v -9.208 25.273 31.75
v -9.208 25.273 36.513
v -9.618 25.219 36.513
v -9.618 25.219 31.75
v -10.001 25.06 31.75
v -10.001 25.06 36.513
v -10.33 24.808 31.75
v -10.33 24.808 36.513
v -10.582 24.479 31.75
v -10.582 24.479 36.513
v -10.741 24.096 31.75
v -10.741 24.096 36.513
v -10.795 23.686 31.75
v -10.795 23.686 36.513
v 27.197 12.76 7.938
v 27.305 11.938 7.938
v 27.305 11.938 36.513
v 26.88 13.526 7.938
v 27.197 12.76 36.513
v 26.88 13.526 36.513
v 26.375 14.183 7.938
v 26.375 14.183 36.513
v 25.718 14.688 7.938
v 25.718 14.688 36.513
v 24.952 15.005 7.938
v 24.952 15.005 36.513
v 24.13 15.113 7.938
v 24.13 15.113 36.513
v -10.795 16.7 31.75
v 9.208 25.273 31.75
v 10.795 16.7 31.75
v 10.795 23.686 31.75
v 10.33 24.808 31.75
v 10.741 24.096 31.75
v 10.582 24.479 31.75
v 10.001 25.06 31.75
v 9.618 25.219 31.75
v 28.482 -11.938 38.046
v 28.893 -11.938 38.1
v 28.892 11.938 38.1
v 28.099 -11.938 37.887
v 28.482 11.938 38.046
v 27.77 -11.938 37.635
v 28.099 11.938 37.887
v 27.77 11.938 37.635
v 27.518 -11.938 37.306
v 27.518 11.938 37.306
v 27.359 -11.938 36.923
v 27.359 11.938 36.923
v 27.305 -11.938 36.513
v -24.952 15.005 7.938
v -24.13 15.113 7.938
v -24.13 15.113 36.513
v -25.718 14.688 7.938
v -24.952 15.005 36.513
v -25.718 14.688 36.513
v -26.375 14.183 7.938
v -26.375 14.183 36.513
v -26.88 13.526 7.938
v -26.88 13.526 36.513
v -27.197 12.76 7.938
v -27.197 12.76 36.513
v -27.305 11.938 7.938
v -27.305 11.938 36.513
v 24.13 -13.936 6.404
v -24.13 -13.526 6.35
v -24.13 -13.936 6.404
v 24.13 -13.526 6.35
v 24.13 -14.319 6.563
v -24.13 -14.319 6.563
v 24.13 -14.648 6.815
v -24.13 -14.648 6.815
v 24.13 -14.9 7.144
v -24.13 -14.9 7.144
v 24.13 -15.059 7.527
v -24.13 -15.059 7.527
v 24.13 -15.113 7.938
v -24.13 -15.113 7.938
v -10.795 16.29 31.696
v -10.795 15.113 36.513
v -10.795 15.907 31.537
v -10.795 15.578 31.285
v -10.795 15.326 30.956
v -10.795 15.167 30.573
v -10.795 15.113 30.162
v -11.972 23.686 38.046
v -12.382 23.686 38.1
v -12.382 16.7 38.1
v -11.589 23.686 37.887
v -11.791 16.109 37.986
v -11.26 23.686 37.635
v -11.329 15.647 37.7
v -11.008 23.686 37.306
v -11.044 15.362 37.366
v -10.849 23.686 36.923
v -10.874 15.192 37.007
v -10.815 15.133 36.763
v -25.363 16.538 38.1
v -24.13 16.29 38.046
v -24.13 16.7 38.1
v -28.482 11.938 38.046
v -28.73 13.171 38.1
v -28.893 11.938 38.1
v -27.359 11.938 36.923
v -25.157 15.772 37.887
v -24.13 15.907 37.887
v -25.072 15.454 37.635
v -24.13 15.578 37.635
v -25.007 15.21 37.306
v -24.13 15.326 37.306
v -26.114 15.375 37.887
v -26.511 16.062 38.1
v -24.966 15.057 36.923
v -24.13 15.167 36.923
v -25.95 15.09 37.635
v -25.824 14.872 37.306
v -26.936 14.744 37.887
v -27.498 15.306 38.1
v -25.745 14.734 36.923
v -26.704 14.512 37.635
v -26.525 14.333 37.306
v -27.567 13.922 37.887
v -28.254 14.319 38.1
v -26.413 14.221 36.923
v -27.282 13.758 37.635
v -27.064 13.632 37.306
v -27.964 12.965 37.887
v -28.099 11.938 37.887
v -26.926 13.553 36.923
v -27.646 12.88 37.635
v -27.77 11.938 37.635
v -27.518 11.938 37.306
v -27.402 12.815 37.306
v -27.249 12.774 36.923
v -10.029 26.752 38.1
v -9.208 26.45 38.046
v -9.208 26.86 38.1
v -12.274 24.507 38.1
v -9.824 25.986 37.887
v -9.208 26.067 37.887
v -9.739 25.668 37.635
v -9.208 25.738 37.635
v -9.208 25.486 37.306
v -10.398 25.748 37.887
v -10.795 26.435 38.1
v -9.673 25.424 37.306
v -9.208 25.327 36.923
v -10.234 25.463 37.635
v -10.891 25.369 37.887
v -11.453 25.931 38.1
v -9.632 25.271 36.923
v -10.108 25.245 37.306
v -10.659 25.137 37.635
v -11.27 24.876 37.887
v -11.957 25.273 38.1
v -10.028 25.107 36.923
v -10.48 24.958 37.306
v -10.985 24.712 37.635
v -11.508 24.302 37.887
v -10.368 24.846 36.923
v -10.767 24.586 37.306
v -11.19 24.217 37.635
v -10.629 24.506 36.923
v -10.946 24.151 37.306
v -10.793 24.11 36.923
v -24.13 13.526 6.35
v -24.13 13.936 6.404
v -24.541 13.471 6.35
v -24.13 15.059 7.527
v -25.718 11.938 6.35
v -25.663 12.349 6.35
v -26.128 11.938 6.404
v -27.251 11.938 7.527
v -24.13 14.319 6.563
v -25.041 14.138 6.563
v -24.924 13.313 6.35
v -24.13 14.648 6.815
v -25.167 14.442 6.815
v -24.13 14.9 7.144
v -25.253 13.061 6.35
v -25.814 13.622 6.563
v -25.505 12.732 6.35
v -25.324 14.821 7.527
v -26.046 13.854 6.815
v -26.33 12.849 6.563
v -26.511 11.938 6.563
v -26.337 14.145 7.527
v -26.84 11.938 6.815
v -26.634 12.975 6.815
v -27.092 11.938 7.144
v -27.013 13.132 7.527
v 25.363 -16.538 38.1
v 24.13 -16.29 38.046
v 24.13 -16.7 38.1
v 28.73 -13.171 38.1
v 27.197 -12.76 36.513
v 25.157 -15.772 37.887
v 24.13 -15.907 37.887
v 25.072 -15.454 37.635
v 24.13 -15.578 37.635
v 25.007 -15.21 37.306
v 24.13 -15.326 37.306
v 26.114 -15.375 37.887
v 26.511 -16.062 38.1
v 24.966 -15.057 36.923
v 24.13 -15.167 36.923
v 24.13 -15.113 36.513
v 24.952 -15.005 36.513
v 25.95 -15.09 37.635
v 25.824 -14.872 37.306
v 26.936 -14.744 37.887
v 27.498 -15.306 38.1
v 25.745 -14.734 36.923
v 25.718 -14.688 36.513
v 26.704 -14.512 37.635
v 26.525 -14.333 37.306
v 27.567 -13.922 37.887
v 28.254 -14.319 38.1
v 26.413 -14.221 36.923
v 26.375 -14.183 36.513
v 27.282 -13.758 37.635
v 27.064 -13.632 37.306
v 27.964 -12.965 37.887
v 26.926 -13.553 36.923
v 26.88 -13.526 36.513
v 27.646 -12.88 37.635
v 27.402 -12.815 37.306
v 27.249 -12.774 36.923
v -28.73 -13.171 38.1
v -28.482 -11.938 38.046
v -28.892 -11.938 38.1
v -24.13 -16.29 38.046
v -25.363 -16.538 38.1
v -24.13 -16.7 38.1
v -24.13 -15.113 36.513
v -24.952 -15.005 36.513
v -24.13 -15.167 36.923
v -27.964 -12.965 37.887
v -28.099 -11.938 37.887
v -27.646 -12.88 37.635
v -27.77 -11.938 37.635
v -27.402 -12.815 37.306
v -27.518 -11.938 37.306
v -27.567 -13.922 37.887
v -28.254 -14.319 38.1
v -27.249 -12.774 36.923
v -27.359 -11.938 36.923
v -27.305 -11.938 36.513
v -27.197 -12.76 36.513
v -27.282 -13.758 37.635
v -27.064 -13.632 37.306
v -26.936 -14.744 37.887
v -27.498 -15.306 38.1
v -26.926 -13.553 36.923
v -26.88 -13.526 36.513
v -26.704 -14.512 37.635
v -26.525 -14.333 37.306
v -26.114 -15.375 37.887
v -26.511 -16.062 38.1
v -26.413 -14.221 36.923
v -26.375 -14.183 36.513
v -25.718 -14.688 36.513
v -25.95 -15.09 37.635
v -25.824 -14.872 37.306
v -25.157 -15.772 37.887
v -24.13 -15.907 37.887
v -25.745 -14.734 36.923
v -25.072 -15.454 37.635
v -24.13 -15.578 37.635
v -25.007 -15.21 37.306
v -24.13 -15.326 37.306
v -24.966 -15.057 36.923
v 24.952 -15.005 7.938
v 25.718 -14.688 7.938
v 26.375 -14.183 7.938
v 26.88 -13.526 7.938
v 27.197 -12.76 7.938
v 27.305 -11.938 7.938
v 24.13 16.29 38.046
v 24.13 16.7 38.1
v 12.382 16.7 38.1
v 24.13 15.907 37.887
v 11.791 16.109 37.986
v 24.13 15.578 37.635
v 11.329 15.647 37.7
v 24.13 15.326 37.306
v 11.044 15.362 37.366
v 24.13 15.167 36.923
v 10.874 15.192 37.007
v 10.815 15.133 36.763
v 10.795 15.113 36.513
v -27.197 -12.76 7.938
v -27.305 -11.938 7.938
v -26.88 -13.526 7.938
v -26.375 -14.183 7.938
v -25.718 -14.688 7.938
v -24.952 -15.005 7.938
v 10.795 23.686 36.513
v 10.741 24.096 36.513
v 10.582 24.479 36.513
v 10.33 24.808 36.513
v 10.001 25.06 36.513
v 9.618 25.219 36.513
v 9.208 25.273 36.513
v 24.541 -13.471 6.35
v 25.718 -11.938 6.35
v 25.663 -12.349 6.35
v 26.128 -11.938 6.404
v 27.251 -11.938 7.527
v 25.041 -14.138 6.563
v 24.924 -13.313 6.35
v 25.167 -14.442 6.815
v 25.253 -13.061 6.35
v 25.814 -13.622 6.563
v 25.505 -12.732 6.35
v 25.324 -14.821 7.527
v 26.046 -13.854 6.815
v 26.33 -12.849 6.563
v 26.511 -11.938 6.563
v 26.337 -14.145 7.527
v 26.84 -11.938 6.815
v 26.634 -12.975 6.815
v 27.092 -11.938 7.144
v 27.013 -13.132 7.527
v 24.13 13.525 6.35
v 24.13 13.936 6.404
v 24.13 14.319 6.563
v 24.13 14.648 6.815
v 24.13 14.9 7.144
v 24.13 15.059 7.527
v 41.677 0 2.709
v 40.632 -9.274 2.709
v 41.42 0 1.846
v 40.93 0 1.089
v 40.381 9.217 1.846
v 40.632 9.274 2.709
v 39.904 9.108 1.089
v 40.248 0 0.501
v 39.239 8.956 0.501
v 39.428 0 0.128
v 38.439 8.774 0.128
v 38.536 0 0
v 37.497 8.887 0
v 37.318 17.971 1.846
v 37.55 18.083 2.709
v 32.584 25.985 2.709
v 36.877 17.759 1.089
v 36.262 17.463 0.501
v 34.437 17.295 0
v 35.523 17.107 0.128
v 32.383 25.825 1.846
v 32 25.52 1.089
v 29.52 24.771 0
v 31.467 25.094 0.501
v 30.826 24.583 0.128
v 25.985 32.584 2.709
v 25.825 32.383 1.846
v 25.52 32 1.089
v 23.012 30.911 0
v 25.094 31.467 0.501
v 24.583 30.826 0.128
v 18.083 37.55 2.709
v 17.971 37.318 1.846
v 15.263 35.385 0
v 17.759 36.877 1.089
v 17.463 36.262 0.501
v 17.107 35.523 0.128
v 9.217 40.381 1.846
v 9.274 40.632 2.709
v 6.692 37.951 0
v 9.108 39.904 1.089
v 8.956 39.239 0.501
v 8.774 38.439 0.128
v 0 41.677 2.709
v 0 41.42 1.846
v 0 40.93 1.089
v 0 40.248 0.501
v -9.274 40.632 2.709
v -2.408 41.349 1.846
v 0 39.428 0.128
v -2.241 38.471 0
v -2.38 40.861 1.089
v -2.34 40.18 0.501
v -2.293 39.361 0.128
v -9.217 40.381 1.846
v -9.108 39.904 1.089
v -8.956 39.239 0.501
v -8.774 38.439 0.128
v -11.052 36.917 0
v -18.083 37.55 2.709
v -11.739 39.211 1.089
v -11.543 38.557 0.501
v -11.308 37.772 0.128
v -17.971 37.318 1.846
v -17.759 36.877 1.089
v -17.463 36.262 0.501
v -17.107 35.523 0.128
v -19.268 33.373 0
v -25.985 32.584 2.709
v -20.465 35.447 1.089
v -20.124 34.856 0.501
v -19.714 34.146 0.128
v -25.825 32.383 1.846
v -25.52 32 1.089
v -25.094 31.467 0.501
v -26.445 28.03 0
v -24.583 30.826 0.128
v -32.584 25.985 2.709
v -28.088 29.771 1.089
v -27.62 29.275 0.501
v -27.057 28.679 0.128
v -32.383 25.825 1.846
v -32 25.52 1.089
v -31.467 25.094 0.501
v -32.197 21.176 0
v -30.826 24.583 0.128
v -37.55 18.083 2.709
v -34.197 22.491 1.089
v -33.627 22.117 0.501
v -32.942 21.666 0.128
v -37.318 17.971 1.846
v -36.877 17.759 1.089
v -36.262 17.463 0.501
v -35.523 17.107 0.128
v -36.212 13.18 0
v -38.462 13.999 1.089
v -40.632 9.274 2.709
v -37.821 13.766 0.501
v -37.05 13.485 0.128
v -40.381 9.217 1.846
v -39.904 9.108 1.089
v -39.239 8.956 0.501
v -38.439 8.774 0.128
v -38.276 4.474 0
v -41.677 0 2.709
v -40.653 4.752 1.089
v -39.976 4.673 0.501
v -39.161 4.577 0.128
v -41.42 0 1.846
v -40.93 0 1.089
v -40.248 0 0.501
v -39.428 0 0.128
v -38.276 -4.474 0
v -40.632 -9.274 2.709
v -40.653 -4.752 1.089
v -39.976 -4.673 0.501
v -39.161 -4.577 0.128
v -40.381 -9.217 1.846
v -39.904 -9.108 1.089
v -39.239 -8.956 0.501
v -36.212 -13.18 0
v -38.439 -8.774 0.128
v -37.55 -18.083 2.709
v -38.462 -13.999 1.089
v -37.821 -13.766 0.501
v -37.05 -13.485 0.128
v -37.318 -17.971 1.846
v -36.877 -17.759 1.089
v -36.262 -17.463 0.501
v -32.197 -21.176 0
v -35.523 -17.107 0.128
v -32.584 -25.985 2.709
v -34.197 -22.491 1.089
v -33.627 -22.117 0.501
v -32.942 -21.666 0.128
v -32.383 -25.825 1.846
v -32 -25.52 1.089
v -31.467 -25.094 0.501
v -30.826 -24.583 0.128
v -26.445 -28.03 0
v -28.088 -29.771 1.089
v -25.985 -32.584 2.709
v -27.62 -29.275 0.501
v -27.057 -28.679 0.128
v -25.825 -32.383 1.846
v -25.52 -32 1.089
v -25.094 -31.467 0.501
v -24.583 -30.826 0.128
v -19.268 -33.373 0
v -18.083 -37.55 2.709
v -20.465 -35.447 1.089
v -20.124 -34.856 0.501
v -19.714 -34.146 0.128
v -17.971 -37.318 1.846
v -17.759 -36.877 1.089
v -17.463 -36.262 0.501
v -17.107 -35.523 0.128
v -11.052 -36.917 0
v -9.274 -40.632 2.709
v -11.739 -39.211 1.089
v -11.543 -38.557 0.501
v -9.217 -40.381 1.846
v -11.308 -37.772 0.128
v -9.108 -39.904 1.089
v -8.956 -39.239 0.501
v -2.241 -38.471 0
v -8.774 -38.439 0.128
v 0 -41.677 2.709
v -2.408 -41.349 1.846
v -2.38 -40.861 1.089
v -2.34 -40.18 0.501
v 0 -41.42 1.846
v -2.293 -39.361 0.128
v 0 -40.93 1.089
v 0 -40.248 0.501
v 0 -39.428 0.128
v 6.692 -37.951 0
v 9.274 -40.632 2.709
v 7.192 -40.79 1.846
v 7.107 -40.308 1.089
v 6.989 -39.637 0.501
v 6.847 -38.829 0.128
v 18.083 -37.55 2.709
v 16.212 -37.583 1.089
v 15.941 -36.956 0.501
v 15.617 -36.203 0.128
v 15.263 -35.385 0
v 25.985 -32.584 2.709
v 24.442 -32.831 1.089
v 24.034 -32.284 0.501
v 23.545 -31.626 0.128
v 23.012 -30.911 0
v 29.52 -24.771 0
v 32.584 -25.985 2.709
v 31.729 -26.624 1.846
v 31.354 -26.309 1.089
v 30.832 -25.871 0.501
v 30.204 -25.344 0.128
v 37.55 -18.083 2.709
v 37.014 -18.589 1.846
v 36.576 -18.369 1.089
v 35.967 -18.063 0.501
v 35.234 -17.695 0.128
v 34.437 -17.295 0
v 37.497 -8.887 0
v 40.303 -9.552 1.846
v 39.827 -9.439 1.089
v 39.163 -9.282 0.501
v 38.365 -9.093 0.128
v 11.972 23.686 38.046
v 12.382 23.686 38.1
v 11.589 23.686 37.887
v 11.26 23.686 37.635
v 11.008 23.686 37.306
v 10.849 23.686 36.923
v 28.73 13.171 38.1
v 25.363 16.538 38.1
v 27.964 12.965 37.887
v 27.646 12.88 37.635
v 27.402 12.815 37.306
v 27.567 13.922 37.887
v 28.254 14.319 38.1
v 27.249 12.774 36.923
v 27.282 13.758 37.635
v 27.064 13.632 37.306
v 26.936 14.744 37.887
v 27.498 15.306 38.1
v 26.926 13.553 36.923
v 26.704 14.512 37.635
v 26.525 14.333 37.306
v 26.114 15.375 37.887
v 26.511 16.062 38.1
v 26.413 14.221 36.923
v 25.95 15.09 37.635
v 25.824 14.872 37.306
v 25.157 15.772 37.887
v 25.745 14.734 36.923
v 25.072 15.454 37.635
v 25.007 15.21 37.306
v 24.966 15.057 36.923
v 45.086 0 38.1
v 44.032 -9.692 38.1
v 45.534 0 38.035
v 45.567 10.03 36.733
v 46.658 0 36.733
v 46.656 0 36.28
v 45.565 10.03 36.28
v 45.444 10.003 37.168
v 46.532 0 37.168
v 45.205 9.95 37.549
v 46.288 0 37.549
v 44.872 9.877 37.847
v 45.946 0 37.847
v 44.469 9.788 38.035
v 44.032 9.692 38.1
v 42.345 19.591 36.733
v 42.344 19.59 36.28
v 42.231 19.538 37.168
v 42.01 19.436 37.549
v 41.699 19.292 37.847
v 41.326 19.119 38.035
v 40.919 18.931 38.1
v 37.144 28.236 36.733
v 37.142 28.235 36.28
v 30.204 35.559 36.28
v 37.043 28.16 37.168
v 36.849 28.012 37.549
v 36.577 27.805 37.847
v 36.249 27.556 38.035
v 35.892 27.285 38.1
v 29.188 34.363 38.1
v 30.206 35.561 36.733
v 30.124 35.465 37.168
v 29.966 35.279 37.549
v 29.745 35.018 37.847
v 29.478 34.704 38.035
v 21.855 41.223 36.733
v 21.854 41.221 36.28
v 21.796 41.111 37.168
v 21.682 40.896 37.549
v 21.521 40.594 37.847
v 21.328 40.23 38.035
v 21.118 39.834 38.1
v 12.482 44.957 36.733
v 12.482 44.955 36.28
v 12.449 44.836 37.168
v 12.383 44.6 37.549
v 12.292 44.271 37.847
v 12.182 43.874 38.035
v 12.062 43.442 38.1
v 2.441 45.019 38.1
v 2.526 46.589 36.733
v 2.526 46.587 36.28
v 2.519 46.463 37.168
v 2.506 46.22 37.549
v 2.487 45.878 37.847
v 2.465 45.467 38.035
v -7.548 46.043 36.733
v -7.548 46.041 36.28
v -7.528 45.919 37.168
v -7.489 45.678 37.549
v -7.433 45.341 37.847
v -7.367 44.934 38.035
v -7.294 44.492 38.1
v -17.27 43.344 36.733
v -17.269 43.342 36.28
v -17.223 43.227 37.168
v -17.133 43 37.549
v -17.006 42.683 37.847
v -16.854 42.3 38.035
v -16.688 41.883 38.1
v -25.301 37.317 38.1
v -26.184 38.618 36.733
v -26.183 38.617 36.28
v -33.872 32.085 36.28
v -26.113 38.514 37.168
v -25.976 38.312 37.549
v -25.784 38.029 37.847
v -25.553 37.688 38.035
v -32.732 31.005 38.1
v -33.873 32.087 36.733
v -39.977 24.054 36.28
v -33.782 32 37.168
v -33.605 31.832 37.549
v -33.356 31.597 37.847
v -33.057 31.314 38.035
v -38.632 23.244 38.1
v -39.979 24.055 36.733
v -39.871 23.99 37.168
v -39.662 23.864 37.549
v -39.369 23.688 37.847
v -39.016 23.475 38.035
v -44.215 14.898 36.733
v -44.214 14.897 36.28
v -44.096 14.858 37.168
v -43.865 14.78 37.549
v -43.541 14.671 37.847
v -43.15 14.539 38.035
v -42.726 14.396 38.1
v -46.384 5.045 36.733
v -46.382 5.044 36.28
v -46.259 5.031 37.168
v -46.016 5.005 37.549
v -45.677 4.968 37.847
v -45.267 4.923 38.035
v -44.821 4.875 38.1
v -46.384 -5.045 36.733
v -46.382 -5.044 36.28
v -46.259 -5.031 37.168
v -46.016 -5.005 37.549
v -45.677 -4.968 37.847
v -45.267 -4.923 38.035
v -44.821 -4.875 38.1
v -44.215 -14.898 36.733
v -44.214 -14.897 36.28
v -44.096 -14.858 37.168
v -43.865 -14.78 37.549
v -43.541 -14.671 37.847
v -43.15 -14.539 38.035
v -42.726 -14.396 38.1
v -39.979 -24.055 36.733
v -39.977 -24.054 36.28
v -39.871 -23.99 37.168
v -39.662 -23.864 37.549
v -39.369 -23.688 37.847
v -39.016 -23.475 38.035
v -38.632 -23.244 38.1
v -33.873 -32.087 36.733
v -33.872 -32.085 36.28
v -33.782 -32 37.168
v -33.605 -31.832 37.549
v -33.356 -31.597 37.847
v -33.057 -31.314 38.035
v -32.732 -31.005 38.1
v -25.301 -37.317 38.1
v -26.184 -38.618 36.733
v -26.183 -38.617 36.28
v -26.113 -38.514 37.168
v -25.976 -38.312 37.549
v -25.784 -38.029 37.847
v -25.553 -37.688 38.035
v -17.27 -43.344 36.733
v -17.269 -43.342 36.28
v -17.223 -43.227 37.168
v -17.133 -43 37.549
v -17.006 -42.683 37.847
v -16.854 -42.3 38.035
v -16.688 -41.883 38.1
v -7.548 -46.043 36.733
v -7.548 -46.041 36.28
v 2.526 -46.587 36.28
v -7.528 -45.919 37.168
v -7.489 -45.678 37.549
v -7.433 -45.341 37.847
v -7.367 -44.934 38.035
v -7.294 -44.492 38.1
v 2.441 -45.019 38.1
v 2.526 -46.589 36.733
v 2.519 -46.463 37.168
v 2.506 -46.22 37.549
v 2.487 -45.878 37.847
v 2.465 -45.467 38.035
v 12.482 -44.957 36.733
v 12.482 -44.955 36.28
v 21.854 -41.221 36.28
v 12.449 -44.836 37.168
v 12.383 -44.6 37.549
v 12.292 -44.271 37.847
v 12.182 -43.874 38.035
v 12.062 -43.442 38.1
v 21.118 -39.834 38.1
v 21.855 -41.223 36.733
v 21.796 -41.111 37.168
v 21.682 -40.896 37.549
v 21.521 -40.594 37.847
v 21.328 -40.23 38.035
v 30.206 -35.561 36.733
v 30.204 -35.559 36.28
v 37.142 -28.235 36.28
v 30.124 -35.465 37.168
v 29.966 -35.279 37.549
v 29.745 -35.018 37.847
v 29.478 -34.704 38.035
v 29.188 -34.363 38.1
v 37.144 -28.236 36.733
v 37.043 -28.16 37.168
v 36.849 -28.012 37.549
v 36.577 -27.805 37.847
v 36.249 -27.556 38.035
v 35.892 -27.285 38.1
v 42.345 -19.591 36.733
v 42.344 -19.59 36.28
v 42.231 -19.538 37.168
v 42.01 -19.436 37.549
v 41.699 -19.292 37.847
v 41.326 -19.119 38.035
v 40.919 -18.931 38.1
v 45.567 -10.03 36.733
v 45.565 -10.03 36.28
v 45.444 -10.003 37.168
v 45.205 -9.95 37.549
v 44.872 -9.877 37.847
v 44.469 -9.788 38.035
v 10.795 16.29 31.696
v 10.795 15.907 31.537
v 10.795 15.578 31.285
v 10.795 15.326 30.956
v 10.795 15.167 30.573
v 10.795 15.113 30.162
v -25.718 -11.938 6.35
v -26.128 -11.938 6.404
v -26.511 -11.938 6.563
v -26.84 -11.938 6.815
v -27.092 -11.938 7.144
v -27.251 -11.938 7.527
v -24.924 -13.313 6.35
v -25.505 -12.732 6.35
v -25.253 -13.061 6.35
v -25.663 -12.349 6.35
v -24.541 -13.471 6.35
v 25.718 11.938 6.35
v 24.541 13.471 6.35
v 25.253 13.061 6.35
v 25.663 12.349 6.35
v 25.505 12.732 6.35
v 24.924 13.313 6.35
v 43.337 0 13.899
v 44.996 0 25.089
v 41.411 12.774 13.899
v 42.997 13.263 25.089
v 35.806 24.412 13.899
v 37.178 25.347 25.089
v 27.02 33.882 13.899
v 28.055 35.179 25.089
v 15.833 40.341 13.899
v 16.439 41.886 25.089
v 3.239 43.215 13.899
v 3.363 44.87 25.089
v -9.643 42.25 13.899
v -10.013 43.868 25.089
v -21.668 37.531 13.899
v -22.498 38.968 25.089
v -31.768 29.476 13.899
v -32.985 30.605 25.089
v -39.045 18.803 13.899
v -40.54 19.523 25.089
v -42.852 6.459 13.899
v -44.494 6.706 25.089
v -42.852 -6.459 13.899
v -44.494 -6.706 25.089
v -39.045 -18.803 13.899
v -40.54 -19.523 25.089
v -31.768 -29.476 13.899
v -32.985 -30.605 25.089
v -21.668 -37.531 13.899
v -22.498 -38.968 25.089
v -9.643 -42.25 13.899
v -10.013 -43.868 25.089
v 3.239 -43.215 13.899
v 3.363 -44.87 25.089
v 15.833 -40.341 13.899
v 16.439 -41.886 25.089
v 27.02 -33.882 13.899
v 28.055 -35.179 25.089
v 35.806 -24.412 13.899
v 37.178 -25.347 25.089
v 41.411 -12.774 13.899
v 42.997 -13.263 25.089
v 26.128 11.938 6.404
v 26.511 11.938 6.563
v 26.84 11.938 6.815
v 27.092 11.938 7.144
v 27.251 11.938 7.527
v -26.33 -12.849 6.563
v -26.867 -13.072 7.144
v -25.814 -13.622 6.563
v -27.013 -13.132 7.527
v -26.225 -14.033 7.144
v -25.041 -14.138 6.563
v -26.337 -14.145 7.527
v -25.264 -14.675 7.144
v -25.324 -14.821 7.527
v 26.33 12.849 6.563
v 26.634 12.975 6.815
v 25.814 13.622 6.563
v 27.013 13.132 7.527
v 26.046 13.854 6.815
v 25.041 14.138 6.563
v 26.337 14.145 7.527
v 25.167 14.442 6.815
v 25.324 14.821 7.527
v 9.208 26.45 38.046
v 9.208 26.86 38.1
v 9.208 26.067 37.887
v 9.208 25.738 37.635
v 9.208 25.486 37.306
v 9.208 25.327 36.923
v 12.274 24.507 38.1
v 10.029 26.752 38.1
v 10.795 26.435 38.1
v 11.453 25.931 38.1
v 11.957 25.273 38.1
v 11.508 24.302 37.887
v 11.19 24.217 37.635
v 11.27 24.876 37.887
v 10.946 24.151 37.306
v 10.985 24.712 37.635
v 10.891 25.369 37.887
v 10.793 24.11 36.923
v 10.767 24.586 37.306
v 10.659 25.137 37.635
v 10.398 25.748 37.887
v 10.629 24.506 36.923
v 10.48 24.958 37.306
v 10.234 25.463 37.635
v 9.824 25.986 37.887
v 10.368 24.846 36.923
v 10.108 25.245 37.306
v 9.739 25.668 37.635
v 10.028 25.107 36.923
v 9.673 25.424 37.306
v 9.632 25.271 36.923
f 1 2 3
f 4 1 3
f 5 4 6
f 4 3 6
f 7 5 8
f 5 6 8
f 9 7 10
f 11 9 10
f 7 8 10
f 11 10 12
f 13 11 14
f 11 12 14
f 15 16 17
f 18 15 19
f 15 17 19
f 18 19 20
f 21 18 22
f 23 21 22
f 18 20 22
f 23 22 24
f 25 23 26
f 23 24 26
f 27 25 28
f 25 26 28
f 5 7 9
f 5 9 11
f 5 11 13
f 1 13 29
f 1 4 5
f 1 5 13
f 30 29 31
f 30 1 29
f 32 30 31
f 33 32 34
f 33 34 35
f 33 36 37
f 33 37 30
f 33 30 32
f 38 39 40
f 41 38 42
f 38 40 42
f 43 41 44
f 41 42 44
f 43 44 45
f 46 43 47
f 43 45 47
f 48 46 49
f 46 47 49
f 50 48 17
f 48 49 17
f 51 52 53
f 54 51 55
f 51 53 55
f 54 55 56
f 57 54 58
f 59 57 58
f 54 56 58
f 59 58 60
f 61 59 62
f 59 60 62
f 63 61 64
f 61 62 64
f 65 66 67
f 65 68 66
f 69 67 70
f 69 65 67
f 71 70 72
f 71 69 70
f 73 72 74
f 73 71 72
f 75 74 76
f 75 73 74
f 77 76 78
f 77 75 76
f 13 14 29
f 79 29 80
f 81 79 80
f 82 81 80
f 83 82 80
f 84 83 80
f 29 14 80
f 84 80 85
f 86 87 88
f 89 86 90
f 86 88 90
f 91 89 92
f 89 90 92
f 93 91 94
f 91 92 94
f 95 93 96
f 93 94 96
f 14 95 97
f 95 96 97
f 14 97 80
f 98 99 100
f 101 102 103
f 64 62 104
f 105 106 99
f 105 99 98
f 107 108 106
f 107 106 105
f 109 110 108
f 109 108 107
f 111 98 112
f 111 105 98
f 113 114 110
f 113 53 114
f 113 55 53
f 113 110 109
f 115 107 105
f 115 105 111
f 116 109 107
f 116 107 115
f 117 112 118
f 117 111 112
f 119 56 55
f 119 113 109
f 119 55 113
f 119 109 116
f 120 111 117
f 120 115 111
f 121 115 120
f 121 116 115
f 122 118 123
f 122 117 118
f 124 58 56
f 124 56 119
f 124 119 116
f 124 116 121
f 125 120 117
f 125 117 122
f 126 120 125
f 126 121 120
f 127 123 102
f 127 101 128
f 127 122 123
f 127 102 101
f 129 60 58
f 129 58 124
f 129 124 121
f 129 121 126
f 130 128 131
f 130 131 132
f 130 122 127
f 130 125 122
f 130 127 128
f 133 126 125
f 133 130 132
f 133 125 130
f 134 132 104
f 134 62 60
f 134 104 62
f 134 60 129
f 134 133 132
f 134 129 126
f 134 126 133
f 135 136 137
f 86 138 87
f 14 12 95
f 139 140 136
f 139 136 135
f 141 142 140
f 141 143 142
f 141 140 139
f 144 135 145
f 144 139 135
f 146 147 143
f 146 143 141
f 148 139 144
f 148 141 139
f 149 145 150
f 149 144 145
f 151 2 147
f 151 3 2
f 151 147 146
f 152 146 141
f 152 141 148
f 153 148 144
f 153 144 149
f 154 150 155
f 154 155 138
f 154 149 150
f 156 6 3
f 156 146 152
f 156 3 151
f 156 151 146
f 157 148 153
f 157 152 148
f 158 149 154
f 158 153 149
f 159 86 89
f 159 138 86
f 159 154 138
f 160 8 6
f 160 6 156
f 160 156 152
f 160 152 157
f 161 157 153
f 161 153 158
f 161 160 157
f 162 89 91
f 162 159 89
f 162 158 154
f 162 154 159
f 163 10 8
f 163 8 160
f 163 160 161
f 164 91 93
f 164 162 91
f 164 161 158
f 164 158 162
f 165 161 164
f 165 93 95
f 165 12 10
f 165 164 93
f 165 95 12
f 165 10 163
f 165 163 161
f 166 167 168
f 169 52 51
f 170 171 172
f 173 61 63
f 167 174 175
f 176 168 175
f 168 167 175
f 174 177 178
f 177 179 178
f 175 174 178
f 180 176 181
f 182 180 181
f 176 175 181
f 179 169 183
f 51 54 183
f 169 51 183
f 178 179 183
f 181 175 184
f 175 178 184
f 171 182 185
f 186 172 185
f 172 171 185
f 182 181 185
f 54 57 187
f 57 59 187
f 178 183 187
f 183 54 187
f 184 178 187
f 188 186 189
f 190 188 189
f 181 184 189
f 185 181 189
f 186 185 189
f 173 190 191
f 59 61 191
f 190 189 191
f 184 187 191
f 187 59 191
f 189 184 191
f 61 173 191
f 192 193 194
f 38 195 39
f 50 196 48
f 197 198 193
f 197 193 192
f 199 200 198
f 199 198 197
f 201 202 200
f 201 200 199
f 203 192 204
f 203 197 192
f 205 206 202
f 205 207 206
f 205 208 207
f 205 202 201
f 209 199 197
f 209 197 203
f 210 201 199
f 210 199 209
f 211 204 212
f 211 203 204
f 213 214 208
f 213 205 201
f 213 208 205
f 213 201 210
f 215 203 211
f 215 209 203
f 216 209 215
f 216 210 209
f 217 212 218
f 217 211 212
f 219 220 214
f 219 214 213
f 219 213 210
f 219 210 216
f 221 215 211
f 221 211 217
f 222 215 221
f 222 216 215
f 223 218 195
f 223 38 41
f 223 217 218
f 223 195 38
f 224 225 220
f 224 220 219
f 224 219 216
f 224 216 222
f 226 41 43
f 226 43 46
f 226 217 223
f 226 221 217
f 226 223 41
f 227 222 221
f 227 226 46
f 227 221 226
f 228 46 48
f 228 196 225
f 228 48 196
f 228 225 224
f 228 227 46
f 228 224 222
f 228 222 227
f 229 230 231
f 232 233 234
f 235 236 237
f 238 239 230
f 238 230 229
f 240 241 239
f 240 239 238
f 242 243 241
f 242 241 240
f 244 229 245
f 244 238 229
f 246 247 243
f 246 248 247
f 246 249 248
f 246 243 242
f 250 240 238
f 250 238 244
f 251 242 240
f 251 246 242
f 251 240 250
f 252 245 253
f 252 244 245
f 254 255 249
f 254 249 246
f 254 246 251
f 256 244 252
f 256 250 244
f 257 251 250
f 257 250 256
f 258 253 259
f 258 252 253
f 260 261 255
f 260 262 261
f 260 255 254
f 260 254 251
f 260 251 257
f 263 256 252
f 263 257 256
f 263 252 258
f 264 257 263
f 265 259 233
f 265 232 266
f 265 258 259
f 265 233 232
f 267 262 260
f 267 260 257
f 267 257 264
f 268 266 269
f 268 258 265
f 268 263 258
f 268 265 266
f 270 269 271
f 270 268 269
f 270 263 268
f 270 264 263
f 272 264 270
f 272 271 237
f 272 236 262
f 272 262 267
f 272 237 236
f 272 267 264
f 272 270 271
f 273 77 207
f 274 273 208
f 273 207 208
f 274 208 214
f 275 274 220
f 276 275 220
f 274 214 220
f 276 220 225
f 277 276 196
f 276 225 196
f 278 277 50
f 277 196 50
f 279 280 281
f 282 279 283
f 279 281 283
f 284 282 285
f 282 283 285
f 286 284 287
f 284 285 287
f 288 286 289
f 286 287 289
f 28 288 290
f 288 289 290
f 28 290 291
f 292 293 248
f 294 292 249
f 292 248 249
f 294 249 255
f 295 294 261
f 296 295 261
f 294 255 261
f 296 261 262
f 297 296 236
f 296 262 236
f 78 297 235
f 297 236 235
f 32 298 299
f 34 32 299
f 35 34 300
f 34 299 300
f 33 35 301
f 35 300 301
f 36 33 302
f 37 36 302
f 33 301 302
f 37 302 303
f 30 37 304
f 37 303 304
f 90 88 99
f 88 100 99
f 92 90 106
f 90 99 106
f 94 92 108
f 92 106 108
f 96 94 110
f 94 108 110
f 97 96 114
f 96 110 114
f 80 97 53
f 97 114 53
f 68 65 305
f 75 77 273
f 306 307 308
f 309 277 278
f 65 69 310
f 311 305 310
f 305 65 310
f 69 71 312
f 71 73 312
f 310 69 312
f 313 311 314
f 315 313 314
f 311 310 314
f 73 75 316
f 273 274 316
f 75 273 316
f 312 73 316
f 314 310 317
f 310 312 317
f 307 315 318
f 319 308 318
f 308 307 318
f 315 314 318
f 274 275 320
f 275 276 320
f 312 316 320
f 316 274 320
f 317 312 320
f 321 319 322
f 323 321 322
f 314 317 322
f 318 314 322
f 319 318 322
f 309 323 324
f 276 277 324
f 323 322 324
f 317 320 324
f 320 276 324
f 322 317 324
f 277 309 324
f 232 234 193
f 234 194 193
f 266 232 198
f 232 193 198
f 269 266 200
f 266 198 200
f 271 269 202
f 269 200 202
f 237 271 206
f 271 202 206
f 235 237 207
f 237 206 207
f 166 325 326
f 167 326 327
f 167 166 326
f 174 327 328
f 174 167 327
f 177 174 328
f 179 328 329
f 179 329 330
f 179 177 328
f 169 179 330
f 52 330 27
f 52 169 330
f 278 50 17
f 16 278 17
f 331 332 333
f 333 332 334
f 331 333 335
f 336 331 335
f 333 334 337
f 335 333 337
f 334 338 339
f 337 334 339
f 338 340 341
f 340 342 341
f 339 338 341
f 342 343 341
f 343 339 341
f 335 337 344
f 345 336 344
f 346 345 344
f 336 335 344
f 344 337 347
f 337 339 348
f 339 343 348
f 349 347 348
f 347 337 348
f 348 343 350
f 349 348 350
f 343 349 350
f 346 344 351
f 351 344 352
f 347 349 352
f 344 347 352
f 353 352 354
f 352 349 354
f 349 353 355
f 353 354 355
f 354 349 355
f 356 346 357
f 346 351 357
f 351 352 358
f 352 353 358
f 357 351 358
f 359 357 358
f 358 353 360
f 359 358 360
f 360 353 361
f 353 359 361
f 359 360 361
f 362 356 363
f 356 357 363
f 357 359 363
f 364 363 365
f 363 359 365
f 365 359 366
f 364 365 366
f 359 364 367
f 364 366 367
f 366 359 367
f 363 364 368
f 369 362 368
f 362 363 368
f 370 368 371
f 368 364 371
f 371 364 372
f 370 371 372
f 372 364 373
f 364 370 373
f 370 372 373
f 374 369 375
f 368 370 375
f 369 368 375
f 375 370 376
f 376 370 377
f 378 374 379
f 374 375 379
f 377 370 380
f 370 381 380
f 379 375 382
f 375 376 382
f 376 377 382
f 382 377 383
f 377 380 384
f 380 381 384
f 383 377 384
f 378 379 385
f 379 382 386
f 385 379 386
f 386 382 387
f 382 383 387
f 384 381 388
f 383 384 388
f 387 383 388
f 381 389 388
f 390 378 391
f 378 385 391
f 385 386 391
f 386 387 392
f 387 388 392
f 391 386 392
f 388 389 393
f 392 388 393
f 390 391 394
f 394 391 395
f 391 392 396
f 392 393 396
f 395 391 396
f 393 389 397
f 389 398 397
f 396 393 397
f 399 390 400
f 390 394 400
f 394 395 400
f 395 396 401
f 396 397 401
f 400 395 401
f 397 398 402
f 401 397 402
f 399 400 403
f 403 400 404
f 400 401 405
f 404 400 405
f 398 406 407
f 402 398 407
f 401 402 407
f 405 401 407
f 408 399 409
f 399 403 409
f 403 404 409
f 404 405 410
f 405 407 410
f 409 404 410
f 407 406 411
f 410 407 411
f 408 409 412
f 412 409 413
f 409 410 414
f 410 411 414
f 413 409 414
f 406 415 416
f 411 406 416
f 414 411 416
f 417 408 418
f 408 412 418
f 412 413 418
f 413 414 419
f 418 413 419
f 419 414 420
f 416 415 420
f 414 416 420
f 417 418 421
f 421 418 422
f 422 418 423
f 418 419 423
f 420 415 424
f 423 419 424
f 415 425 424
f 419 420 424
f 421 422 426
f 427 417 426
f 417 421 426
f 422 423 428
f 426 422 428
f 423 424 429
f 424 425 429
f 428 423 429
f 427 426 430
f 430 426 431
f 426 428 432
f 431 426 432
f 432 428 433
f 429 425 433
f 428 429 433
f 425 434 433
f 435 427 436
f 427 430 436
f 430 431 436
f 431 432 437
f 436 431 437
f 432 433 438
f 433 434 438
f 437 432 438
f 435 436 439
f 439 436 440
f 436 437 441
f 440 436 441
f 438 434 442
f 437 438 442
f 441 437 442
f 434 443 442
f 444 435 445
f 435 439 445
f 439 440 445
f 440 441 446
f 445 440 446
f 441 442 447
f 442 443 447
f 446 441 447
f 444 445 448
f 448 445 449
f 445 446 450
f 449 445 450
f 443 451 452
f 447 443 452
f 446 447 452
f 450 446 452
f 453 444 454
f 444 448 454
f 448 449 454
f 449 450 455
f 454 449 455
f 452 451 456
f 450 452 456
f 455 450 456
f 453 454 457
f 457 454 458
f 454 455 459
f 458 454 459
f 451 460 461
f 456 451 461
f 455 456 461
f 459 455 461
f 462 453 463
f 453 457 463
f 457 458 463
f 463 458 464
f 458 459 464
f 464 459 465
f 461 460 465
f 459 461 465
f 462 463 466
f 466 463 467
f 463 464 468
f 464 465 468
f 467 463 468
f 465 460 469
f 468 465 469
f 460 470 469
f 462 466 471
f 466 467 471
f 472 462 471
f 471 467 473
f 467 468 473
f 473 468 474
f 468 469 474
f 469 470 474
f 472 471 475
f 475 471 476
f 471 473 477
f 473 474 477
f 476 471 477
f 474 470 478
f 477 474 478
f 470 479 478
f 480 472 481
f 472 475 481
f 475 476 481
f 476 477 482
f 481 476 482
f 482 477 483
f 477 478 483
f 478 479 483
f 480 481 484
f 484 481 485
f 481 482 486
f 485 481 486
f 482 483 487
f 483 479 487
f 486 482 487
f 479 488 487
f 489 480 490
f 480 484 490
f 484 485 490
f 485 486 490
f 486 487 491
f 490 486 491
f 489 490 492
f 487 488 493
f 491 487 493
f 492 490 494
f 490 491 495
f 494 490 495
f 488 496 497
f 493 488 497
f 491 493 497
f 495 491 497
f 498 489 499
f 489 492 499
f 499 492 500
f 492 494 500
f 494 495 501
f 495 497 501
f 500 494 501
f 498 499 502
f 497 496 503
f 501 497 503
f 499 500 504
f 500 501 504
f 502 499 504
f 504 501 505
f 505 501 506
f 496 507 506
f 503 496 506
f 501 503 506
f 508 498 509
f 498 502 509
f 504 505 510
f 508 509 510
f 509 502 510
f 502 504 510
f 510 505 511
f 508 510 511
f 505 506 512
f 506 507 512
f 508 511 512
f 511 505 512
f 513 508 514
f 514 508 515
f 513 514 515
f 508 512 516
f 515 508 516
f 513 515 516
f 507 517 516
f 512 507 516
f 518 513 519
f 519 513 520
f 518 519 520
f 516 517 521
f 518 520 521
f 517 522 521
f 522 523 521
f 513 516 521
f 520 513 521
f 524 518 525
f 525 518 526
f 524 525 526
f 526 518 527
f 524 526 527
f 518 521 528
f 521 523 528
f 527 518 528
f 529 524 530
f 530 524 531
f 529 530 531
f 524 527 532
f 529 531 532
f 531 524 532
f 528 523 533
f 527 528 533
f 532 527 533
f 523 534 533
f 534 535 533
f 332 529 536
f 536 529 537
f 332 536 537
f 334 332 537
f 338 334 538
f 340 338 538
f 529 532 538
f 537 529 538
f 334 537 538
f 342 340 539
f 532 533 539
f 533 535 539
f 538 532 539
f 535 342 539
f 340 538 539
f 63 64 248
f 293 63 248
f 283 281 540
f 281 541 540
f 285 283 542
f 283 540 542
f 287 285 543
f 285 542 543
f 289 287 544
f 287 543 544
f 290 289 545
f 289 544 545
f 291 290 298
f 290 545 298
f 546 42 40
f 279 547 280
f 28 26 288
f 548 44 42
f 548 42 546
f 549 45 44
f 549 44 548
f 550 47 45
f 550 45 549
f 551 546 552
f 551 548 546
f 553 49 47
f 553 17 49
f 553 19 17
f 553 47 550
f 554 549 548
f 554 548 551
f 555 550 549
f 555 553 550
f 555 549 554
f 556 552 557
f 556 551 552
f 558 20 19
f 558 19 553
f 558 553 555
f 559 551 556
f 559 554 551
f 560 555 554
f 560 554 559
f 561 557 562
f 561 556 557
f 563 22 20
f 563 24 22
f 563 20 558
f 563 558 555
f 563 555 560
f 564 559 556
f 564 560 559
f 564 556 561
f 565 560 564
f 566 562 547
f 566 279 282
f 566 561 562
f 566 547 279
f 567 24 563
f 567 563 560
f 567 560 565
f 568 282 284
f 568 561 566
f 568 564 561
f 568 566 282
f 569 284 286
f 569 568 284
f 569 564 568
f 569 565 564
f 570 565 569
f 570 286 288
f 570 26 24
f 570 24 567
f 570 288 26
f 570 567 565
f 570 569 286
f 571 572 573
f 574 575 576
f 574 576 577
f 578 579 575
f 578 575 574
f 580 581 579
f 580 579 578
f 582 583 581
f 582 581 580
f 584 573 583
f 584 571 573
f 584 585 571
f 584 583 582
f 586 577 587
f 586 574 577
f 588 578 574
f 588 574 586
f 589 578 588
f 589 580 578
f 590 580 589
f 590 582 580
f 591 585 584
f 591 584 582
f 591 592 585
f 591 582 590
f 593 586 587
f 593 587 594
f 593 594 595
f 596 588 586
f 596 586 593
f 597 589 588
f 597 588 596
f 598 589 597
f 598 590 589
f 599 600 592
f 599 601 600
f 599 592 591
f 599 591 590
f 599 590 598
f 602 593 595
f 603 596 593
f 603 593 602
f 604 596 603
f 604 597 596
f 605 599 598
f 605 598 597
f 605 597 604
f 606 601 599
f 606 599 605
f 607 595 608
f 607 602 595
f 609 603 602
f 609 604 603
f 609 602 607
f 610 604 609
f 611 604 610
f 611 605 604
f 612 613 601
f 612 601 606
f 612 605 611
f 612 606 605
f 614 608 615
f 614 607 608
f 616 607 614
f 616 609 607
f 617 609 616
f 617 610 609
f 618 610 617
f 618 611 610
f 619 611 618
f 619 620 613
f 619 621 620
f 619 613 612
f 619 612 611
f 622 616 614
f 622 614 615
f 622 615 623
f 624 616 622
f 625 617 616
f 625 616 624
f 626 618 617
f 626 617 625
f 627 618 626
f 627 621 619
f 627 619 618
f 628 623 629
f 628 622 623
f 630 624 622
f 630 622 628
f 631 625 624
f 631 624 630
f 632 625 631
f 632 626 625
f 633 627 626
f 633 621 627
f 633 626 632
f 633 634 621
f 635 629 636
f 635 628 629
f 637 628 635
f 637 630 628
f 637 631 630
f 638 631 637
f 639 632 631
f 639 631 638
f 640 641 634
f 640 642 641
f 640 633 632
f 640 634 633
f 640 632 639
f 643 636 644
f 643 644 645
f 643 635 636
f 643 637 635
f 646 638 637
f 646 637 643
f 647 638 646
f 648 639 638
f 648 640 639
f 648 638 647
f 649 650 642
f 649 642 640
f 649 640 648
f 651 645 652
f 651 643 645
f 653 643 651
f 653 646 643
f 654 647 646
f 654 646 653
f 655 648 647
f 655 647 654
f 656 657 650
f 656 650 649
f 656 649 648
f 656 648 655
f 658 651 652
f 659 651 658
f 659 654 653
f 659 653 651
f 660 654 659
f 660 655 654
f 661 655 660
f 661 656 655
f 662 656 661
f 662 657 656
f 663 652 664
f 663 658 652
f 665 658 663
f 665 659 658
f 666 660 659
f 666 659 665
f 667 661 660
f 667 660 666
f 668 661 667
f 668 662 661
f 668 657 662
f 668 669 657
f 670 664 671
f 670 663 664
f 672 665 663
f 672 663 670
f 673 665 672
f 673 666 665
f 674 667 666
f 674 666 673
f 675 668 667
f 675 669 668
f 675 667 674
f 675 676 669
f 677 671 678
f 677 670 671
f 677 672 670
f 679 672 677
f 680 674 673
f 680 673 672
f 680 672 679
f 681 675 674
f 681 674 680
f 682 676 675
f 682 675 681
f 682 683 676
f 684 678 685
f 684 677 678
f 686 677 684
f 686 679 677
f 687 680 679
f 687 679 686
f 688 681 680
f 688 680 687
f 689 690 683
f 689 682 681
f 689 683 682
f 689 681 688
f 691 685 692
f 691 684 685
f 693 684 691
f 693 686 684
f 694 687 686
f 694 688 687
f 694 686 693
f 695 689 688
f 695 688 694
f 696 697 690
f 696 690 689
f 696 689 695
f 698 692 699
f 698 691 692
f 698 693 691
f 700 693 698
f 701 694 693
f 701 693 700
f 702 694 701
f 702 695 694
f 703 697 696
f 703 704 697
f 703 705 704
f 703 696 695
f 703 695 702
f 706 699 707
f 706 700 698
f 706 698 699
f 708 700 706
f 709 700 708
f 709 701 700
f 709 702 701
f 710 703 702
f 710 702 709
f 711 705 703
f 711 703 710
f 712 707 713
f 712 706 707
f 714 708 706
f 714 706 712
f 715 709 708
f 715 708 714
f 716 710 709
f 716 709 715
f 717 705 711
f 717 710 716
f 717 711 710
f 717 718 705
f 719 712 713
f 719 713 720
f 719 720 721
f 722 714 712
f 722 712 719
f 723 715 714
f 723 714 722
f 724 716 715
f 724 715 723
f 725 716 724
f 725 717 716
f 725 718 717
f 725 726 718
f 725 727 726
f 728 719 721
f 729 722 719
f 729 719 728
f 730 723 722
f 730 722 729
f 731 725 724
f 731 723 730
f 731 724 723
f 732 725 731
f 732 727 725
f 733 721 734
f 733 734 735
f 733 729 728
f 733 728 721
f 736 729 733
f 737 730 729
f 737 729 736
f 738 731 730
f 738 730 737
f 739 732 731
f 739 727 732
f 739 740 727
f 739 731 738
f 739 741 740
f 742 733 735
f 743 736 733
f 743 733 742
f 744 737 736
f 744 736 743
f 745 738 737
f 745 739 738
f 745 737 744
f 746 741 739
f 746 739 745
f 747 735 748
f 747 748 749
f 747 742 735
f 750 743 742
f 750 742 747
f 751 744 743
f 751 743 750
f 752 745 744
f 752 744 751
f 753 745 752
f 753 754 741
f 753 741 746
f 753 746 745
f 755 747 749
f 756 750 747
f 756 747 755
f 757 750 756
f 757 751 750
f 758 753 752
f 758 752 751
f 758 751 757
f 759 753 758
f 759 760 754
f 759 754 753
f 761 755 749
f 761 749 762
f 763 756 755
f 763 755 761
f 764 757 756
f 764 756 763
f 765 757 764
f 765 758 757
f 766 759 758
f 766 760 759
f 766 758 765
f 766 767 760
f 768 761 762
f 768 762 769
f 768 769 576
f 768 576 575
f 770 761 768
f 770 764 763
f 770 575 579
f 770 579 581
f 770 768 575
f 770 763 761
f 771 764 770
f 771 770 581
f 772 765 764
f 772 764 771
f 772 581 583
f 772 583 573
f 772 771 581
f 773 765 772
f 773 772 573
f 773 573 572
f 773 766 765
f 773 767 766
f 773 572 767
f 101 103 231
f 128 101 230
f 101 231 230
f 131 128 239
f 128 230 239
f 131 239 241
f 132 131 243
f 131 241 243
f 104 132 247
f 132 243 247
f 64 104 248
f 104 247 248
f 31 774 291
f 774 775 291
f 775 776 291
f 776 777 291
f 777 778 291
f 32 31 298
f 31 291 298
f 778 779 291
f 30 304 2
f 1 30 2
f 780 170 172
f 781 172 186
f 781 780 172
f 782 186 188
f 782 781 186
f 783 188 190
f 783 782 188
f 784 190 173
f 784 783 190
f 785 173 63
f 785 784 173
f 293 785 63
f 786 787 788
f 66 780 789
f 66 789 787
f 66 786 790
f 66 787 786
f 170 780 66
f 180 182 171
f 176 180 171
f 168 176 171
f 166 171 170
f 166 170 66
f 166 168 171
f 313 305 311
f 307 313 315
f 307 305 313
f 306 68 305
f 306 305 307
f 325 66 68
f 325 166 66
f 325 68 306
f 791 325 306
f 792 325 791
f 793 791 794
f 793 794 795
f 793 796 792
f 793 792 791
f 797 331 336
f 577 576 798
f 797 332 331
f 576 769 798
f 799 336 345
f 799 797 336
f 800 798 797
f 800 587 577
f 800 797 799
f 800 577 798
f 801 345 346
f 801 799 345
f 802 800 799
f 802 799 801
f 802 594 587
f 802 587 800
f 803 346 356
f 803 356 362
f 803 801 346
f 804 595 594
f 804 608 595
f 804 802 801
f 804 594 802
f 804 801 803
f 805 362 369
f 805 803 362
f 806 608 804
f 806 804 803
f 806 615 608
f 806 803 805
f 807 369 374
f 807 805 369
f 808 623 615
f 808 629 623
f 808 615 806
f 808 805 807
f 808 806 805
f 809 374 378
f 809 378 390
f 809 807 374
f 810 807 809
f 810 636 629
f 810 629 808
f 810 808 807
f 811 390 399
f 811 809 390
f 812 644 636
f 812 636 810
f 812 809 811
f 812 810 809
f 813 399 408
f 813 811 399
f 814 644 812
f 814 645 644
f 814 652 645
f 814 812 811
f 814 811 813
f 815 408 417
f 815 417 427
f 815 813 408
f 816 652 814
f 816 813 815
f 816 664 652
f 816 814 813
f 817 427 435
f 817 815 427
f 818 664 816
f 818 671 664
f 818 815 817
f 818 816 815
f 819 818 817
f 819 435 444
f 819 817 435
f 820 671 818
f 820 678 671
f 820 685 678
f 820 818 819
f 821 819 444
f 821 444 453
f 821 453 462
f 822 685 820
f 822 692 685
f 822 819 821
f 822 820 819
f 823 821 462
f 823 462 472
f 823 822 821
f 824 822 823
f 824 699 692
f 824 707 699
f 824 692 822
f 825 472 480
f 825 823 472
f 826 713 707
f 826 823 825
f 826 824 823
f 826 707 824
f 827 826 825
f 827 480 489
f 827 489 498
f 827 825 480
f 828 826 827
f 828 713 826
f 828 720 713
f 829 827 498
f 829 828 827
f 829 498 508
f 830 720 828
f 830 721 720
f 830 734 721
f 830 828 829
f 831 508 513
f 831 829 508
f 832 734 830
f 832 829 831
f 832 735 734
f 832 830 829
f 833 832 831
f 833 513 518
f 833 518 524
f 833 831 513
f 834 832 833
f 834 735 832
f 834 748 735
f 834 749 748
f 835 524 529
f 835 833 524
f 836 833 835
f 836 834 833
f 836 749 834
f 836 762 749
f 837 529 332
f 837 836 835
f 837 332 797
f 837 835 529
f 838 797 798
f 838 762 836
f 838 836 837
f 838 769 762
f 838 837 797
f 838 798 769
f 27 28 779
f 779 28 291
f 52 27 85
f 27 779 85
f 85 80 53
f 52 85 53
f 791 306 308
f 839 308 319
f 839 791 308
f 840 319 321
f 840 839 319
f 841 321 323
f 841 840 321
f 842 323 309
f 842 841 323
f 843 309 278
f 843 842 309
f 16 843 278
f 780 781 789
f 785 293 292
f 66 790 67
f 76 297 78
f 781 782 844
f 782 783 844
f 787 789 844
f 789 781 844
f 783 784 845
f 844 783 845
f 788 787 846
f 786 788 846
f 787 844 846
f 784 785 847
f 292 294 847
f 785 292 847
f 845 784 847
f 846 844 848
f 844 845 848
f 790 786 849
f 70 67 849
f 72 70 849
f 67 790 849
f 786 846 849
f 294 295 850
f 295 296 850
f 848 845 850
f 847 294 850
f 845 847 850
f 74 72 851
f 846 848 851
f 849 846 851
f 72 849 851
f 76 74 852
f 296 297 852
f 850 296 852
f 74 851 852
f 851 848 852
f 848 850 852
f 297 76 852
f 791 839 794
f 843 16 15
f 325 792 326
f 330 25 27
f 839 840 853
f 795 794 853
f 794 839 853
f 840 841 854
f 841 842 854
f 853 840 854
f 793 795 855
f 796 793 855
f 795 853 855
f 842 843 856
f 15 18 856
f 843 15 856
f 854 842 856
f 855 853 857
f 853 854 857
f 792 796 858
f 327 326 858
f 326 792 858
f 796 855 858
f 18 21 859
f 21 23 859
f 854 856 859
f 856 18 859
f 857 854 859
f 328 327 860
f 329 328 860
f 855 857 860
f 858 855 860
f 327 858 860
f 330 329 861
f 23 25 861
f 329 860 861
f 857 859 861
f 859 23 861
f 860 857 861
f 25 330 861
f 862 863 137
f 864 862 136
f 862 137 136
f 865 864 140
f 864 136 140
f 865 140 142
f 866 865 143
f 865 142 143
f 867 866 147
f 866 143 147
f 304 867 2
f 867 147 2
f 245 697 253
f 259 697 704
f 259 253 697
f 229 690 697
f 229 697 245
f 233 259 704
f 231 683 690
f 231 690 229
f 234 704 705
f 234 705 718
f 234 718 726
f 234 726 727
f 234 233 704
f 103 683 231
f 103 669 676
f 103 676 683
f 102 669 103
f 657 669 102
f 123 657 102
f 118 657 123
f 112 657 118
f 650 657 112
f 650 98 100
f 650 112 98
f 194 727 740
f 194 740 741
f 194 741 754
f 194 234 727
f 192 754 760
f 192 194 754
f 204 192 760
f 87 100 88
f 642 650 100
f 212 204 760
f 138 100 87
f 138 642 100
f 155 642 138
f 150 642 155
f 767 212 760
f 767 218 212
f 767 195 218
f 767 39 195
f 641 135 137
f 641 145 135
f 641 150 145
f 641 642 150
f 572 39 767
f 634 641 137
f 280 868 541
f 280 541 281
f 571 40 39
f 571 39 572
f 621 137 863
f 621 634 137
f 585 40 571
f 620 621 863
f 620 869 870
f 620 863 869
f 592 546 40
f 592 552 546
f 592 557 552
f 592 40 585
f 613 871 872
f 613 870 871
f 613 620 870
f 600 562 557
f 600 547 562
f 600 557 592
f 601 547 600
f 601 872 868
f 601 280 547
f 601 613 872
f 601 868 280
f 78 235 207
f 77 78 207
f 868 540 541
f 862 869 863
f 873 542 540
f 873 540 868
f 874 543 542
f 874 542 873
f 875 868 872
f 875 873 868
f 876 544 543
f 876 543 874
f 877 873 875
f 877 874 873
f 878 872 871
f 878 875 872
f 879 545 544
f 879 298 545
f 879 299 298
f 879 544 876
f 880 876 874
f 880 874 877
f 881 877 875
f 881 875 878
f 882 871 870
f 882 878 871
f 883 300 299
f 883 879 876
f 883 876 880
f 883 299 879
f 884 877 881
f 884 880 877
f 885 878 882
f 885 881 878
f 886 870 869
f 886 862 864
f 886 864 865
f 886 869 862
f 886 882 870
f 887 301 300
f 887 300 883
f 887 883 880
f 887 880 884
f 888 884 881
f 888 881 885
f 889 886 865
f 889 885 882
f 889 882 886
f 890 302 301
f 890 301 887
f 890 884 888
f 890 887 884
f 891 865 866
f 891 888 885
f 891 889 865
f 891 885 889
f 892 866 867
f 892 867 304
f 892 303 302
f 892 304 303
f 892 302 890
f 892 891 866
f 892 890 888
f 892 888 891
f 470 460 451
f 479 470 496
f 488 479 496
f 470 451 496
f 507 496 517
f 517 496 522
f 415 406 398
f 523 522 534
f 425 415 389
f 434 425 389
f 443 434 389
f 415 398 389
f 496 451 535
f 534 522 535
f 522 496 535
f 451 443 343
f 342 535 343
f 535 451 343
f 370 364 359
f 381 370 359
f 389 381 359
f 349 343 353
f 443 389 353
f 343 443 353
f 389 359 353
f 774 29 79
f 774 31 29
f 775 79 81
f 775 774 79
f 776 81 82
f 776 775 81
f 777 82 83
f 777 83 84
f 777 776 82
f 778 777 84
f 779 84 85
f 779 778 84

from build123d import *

# Parameters (mm, degrees)
F0_R     = 41.275
F2_R     = 53.594
F5_R     = 3.175
F7_DEPTH = 44.958
F8_DEPTH = 31.75
F9_DEPTH = 6.35
F10_R    = 1.5875


with BuildPart() as f3:
    # F0 (on Top) → F3 section 0
    with BuildSketch(Plane.XY):
        Circle(F0_R)
    # F2 (on offset) → F3 section 1
    with BuildSketch(Plane.XY.offset(83.058)):
        Circle(F2_R)
    loft()

    # F5
    f5_edges = [f3.edges().sort_by_distance(p)[0] for p in [
        (-41.275, 0, 0),
    ]]
    fillet(f5_edges, radius=F5_R)

    # F7 (cut, through all): a face of the model
    f7_faces = [f3.faces().sort_by_distance(p)[0] for p in [
        (0, 0, 83.058),
    ]]
    extrude(f7_faces, amount=-F7_DEPTH, mode=Mode.SUBTRACT)

    # F6 (on offset) → F8 (cut)
    with BuildSketch(Plane.XY.offset(38.1)):
        with BuildLine():
            Line((-24.13, -15.113), (0, -15.113))
            Line((0, -15.113), (0, 15.113))
            Line((0, 15.113), (-10.795, 15.113))
            Line((-10.795, 15.113), (-24.13, 15.113))
            ThreePointArc((-24.13, 15.113), (-26.3750640303, 14.1830640303), (-27.305, 11.938))
            Line((-27.305, 11.938), (-27.305, -11.938))
            ThreePointArc((-27.305, -11.938), (-26.3750640303, -14.1830640303), (-24.13, -15.113))
        make_face()
        with BuildLine():
            Line((0, -15.113), (24.13, -15.113))
            ThreePointArc((24.13, -15.113), (26.3750640303, -14.1830640303), (27.305, -11.938))
            Line((27.305, -11.938), (27.305, 11.938))
            ThreePointArc((27.305, 11.938), (26.3750640303, 14.1830640303), (24.13, 15.113))
            Line((24.13, 15.113), (10.795, 15.113))
            Line((10.795, 15.113), (0, 15.113))
            Line((0, 15.113), (0, -15.113))
        make_face()
    extrude(amount=-F8_DEPTH, mode=Mode.SUBTRACT)

    # F6 (on offset) → F9 (cut)
    with BuildSketch(Plane.XY.offset(38.1)):
        with BuildLine():
            Line((0, -15.113), (24.13, -15.113))
            ThreePointArc((24.13, -15.113), (26.3750640303, -14.1830640303), (27.305, -11.938))
            Line((27.305, -11.938), (27.305, 11.938))
            ThreePointArc((27.305, 11.938), (26.3750640303, 14.1830640303), (24.13, 15.113))
            Line((24.13, 15.113), (10.795, 15.113))
            Line((10.795, 15.113), (0, 15.113))
            Line((0, 15.113), (0, -15.113))
        make_face()
        with BuildLine():
            Line((-24.13, -15.113), (0, -15.113))
            Line((0, -15.113), (0, 15.113))
            Line((0, 15.113), (-10.795, 15.113))
            Line((-10.795, 15.113), (-24.13, 15.113))
            ThreePointArc((-24.13, 15.113), (-26.3750640303, 14.1830640303), (-27.305, 11.938))
            Line((-27.305, 11.938), (-27.305, -11.938))
            ThreePointArc((-27.305, -11.938), (-26.3750640303, -14.1830640303), (-24.13, -15.113))
        make_face()
        with BuildLine():
            Line((-10.795, 15.113), (0, 15.113))
            Line((0, 15.113), (10.795, 15.113))
            Line((10.795, 15.113), (10.795, 23.6855))
            ThreePointArc((10.795, 23.6855), (10.3300320151, 24.8080320151), (9.2075, 25.273))
            Line((9.2075, 25.273), (-9.2075, 25.273))
            ThreePointArc((-9.2075, 25.273), (-10.3300320151, 24.8080320151), (-10.795, 23.6855))
            Line((-10.795, 23.6855), (-10.795, 15.113))
        make_face()
    extrude(amount=-F9_DEPTH, mode=Mode.SUBTRACT)

    # F10
    f10_edges = [f3.edges().sort_by_distance(p)[0] for p in [
        (0, 15.113, 31.75),
        (0, -15.113, 6.35),
        (26.375064, -14.183064, 6.35),
        (27.305, 0, 6.35),
        (26.375064, 14.183064, 6.35),
        (0, 15.113, 6.35),
        (-26.375064, 14.183064, 6.35),
        (-27.305, 0, 6.35),
        (-26.375064, -14.183064, 6.35),
        (-46.925917, 0, 38.1),
        (0, -15.113, 38.1),
        (26.375064, -14.183064, 38.1),
        (27.305, 0, 38.1),
        (26.375064, 14.183064, 38.1),
        (17.4625, 15.113, 38.1),
        (10.795, 19.39925, 38.1),
        (10.330032, 24.808032, 38.1),
        (0, 25.273, 38.1),
        (-10.330032, 24.808032, 38.1),
        (-10.795, 19.39925, 38.1),
        (-17.4625, 15.113, 38.1),
        (-26.375064, 14.183064, 38.1),
        (-27.305, 0, 38.1),
        (-26.375064, -14.183064, 38.1),
    ]]
    fillet(f10_edges, radius=F10_R)


solid = f3.part
